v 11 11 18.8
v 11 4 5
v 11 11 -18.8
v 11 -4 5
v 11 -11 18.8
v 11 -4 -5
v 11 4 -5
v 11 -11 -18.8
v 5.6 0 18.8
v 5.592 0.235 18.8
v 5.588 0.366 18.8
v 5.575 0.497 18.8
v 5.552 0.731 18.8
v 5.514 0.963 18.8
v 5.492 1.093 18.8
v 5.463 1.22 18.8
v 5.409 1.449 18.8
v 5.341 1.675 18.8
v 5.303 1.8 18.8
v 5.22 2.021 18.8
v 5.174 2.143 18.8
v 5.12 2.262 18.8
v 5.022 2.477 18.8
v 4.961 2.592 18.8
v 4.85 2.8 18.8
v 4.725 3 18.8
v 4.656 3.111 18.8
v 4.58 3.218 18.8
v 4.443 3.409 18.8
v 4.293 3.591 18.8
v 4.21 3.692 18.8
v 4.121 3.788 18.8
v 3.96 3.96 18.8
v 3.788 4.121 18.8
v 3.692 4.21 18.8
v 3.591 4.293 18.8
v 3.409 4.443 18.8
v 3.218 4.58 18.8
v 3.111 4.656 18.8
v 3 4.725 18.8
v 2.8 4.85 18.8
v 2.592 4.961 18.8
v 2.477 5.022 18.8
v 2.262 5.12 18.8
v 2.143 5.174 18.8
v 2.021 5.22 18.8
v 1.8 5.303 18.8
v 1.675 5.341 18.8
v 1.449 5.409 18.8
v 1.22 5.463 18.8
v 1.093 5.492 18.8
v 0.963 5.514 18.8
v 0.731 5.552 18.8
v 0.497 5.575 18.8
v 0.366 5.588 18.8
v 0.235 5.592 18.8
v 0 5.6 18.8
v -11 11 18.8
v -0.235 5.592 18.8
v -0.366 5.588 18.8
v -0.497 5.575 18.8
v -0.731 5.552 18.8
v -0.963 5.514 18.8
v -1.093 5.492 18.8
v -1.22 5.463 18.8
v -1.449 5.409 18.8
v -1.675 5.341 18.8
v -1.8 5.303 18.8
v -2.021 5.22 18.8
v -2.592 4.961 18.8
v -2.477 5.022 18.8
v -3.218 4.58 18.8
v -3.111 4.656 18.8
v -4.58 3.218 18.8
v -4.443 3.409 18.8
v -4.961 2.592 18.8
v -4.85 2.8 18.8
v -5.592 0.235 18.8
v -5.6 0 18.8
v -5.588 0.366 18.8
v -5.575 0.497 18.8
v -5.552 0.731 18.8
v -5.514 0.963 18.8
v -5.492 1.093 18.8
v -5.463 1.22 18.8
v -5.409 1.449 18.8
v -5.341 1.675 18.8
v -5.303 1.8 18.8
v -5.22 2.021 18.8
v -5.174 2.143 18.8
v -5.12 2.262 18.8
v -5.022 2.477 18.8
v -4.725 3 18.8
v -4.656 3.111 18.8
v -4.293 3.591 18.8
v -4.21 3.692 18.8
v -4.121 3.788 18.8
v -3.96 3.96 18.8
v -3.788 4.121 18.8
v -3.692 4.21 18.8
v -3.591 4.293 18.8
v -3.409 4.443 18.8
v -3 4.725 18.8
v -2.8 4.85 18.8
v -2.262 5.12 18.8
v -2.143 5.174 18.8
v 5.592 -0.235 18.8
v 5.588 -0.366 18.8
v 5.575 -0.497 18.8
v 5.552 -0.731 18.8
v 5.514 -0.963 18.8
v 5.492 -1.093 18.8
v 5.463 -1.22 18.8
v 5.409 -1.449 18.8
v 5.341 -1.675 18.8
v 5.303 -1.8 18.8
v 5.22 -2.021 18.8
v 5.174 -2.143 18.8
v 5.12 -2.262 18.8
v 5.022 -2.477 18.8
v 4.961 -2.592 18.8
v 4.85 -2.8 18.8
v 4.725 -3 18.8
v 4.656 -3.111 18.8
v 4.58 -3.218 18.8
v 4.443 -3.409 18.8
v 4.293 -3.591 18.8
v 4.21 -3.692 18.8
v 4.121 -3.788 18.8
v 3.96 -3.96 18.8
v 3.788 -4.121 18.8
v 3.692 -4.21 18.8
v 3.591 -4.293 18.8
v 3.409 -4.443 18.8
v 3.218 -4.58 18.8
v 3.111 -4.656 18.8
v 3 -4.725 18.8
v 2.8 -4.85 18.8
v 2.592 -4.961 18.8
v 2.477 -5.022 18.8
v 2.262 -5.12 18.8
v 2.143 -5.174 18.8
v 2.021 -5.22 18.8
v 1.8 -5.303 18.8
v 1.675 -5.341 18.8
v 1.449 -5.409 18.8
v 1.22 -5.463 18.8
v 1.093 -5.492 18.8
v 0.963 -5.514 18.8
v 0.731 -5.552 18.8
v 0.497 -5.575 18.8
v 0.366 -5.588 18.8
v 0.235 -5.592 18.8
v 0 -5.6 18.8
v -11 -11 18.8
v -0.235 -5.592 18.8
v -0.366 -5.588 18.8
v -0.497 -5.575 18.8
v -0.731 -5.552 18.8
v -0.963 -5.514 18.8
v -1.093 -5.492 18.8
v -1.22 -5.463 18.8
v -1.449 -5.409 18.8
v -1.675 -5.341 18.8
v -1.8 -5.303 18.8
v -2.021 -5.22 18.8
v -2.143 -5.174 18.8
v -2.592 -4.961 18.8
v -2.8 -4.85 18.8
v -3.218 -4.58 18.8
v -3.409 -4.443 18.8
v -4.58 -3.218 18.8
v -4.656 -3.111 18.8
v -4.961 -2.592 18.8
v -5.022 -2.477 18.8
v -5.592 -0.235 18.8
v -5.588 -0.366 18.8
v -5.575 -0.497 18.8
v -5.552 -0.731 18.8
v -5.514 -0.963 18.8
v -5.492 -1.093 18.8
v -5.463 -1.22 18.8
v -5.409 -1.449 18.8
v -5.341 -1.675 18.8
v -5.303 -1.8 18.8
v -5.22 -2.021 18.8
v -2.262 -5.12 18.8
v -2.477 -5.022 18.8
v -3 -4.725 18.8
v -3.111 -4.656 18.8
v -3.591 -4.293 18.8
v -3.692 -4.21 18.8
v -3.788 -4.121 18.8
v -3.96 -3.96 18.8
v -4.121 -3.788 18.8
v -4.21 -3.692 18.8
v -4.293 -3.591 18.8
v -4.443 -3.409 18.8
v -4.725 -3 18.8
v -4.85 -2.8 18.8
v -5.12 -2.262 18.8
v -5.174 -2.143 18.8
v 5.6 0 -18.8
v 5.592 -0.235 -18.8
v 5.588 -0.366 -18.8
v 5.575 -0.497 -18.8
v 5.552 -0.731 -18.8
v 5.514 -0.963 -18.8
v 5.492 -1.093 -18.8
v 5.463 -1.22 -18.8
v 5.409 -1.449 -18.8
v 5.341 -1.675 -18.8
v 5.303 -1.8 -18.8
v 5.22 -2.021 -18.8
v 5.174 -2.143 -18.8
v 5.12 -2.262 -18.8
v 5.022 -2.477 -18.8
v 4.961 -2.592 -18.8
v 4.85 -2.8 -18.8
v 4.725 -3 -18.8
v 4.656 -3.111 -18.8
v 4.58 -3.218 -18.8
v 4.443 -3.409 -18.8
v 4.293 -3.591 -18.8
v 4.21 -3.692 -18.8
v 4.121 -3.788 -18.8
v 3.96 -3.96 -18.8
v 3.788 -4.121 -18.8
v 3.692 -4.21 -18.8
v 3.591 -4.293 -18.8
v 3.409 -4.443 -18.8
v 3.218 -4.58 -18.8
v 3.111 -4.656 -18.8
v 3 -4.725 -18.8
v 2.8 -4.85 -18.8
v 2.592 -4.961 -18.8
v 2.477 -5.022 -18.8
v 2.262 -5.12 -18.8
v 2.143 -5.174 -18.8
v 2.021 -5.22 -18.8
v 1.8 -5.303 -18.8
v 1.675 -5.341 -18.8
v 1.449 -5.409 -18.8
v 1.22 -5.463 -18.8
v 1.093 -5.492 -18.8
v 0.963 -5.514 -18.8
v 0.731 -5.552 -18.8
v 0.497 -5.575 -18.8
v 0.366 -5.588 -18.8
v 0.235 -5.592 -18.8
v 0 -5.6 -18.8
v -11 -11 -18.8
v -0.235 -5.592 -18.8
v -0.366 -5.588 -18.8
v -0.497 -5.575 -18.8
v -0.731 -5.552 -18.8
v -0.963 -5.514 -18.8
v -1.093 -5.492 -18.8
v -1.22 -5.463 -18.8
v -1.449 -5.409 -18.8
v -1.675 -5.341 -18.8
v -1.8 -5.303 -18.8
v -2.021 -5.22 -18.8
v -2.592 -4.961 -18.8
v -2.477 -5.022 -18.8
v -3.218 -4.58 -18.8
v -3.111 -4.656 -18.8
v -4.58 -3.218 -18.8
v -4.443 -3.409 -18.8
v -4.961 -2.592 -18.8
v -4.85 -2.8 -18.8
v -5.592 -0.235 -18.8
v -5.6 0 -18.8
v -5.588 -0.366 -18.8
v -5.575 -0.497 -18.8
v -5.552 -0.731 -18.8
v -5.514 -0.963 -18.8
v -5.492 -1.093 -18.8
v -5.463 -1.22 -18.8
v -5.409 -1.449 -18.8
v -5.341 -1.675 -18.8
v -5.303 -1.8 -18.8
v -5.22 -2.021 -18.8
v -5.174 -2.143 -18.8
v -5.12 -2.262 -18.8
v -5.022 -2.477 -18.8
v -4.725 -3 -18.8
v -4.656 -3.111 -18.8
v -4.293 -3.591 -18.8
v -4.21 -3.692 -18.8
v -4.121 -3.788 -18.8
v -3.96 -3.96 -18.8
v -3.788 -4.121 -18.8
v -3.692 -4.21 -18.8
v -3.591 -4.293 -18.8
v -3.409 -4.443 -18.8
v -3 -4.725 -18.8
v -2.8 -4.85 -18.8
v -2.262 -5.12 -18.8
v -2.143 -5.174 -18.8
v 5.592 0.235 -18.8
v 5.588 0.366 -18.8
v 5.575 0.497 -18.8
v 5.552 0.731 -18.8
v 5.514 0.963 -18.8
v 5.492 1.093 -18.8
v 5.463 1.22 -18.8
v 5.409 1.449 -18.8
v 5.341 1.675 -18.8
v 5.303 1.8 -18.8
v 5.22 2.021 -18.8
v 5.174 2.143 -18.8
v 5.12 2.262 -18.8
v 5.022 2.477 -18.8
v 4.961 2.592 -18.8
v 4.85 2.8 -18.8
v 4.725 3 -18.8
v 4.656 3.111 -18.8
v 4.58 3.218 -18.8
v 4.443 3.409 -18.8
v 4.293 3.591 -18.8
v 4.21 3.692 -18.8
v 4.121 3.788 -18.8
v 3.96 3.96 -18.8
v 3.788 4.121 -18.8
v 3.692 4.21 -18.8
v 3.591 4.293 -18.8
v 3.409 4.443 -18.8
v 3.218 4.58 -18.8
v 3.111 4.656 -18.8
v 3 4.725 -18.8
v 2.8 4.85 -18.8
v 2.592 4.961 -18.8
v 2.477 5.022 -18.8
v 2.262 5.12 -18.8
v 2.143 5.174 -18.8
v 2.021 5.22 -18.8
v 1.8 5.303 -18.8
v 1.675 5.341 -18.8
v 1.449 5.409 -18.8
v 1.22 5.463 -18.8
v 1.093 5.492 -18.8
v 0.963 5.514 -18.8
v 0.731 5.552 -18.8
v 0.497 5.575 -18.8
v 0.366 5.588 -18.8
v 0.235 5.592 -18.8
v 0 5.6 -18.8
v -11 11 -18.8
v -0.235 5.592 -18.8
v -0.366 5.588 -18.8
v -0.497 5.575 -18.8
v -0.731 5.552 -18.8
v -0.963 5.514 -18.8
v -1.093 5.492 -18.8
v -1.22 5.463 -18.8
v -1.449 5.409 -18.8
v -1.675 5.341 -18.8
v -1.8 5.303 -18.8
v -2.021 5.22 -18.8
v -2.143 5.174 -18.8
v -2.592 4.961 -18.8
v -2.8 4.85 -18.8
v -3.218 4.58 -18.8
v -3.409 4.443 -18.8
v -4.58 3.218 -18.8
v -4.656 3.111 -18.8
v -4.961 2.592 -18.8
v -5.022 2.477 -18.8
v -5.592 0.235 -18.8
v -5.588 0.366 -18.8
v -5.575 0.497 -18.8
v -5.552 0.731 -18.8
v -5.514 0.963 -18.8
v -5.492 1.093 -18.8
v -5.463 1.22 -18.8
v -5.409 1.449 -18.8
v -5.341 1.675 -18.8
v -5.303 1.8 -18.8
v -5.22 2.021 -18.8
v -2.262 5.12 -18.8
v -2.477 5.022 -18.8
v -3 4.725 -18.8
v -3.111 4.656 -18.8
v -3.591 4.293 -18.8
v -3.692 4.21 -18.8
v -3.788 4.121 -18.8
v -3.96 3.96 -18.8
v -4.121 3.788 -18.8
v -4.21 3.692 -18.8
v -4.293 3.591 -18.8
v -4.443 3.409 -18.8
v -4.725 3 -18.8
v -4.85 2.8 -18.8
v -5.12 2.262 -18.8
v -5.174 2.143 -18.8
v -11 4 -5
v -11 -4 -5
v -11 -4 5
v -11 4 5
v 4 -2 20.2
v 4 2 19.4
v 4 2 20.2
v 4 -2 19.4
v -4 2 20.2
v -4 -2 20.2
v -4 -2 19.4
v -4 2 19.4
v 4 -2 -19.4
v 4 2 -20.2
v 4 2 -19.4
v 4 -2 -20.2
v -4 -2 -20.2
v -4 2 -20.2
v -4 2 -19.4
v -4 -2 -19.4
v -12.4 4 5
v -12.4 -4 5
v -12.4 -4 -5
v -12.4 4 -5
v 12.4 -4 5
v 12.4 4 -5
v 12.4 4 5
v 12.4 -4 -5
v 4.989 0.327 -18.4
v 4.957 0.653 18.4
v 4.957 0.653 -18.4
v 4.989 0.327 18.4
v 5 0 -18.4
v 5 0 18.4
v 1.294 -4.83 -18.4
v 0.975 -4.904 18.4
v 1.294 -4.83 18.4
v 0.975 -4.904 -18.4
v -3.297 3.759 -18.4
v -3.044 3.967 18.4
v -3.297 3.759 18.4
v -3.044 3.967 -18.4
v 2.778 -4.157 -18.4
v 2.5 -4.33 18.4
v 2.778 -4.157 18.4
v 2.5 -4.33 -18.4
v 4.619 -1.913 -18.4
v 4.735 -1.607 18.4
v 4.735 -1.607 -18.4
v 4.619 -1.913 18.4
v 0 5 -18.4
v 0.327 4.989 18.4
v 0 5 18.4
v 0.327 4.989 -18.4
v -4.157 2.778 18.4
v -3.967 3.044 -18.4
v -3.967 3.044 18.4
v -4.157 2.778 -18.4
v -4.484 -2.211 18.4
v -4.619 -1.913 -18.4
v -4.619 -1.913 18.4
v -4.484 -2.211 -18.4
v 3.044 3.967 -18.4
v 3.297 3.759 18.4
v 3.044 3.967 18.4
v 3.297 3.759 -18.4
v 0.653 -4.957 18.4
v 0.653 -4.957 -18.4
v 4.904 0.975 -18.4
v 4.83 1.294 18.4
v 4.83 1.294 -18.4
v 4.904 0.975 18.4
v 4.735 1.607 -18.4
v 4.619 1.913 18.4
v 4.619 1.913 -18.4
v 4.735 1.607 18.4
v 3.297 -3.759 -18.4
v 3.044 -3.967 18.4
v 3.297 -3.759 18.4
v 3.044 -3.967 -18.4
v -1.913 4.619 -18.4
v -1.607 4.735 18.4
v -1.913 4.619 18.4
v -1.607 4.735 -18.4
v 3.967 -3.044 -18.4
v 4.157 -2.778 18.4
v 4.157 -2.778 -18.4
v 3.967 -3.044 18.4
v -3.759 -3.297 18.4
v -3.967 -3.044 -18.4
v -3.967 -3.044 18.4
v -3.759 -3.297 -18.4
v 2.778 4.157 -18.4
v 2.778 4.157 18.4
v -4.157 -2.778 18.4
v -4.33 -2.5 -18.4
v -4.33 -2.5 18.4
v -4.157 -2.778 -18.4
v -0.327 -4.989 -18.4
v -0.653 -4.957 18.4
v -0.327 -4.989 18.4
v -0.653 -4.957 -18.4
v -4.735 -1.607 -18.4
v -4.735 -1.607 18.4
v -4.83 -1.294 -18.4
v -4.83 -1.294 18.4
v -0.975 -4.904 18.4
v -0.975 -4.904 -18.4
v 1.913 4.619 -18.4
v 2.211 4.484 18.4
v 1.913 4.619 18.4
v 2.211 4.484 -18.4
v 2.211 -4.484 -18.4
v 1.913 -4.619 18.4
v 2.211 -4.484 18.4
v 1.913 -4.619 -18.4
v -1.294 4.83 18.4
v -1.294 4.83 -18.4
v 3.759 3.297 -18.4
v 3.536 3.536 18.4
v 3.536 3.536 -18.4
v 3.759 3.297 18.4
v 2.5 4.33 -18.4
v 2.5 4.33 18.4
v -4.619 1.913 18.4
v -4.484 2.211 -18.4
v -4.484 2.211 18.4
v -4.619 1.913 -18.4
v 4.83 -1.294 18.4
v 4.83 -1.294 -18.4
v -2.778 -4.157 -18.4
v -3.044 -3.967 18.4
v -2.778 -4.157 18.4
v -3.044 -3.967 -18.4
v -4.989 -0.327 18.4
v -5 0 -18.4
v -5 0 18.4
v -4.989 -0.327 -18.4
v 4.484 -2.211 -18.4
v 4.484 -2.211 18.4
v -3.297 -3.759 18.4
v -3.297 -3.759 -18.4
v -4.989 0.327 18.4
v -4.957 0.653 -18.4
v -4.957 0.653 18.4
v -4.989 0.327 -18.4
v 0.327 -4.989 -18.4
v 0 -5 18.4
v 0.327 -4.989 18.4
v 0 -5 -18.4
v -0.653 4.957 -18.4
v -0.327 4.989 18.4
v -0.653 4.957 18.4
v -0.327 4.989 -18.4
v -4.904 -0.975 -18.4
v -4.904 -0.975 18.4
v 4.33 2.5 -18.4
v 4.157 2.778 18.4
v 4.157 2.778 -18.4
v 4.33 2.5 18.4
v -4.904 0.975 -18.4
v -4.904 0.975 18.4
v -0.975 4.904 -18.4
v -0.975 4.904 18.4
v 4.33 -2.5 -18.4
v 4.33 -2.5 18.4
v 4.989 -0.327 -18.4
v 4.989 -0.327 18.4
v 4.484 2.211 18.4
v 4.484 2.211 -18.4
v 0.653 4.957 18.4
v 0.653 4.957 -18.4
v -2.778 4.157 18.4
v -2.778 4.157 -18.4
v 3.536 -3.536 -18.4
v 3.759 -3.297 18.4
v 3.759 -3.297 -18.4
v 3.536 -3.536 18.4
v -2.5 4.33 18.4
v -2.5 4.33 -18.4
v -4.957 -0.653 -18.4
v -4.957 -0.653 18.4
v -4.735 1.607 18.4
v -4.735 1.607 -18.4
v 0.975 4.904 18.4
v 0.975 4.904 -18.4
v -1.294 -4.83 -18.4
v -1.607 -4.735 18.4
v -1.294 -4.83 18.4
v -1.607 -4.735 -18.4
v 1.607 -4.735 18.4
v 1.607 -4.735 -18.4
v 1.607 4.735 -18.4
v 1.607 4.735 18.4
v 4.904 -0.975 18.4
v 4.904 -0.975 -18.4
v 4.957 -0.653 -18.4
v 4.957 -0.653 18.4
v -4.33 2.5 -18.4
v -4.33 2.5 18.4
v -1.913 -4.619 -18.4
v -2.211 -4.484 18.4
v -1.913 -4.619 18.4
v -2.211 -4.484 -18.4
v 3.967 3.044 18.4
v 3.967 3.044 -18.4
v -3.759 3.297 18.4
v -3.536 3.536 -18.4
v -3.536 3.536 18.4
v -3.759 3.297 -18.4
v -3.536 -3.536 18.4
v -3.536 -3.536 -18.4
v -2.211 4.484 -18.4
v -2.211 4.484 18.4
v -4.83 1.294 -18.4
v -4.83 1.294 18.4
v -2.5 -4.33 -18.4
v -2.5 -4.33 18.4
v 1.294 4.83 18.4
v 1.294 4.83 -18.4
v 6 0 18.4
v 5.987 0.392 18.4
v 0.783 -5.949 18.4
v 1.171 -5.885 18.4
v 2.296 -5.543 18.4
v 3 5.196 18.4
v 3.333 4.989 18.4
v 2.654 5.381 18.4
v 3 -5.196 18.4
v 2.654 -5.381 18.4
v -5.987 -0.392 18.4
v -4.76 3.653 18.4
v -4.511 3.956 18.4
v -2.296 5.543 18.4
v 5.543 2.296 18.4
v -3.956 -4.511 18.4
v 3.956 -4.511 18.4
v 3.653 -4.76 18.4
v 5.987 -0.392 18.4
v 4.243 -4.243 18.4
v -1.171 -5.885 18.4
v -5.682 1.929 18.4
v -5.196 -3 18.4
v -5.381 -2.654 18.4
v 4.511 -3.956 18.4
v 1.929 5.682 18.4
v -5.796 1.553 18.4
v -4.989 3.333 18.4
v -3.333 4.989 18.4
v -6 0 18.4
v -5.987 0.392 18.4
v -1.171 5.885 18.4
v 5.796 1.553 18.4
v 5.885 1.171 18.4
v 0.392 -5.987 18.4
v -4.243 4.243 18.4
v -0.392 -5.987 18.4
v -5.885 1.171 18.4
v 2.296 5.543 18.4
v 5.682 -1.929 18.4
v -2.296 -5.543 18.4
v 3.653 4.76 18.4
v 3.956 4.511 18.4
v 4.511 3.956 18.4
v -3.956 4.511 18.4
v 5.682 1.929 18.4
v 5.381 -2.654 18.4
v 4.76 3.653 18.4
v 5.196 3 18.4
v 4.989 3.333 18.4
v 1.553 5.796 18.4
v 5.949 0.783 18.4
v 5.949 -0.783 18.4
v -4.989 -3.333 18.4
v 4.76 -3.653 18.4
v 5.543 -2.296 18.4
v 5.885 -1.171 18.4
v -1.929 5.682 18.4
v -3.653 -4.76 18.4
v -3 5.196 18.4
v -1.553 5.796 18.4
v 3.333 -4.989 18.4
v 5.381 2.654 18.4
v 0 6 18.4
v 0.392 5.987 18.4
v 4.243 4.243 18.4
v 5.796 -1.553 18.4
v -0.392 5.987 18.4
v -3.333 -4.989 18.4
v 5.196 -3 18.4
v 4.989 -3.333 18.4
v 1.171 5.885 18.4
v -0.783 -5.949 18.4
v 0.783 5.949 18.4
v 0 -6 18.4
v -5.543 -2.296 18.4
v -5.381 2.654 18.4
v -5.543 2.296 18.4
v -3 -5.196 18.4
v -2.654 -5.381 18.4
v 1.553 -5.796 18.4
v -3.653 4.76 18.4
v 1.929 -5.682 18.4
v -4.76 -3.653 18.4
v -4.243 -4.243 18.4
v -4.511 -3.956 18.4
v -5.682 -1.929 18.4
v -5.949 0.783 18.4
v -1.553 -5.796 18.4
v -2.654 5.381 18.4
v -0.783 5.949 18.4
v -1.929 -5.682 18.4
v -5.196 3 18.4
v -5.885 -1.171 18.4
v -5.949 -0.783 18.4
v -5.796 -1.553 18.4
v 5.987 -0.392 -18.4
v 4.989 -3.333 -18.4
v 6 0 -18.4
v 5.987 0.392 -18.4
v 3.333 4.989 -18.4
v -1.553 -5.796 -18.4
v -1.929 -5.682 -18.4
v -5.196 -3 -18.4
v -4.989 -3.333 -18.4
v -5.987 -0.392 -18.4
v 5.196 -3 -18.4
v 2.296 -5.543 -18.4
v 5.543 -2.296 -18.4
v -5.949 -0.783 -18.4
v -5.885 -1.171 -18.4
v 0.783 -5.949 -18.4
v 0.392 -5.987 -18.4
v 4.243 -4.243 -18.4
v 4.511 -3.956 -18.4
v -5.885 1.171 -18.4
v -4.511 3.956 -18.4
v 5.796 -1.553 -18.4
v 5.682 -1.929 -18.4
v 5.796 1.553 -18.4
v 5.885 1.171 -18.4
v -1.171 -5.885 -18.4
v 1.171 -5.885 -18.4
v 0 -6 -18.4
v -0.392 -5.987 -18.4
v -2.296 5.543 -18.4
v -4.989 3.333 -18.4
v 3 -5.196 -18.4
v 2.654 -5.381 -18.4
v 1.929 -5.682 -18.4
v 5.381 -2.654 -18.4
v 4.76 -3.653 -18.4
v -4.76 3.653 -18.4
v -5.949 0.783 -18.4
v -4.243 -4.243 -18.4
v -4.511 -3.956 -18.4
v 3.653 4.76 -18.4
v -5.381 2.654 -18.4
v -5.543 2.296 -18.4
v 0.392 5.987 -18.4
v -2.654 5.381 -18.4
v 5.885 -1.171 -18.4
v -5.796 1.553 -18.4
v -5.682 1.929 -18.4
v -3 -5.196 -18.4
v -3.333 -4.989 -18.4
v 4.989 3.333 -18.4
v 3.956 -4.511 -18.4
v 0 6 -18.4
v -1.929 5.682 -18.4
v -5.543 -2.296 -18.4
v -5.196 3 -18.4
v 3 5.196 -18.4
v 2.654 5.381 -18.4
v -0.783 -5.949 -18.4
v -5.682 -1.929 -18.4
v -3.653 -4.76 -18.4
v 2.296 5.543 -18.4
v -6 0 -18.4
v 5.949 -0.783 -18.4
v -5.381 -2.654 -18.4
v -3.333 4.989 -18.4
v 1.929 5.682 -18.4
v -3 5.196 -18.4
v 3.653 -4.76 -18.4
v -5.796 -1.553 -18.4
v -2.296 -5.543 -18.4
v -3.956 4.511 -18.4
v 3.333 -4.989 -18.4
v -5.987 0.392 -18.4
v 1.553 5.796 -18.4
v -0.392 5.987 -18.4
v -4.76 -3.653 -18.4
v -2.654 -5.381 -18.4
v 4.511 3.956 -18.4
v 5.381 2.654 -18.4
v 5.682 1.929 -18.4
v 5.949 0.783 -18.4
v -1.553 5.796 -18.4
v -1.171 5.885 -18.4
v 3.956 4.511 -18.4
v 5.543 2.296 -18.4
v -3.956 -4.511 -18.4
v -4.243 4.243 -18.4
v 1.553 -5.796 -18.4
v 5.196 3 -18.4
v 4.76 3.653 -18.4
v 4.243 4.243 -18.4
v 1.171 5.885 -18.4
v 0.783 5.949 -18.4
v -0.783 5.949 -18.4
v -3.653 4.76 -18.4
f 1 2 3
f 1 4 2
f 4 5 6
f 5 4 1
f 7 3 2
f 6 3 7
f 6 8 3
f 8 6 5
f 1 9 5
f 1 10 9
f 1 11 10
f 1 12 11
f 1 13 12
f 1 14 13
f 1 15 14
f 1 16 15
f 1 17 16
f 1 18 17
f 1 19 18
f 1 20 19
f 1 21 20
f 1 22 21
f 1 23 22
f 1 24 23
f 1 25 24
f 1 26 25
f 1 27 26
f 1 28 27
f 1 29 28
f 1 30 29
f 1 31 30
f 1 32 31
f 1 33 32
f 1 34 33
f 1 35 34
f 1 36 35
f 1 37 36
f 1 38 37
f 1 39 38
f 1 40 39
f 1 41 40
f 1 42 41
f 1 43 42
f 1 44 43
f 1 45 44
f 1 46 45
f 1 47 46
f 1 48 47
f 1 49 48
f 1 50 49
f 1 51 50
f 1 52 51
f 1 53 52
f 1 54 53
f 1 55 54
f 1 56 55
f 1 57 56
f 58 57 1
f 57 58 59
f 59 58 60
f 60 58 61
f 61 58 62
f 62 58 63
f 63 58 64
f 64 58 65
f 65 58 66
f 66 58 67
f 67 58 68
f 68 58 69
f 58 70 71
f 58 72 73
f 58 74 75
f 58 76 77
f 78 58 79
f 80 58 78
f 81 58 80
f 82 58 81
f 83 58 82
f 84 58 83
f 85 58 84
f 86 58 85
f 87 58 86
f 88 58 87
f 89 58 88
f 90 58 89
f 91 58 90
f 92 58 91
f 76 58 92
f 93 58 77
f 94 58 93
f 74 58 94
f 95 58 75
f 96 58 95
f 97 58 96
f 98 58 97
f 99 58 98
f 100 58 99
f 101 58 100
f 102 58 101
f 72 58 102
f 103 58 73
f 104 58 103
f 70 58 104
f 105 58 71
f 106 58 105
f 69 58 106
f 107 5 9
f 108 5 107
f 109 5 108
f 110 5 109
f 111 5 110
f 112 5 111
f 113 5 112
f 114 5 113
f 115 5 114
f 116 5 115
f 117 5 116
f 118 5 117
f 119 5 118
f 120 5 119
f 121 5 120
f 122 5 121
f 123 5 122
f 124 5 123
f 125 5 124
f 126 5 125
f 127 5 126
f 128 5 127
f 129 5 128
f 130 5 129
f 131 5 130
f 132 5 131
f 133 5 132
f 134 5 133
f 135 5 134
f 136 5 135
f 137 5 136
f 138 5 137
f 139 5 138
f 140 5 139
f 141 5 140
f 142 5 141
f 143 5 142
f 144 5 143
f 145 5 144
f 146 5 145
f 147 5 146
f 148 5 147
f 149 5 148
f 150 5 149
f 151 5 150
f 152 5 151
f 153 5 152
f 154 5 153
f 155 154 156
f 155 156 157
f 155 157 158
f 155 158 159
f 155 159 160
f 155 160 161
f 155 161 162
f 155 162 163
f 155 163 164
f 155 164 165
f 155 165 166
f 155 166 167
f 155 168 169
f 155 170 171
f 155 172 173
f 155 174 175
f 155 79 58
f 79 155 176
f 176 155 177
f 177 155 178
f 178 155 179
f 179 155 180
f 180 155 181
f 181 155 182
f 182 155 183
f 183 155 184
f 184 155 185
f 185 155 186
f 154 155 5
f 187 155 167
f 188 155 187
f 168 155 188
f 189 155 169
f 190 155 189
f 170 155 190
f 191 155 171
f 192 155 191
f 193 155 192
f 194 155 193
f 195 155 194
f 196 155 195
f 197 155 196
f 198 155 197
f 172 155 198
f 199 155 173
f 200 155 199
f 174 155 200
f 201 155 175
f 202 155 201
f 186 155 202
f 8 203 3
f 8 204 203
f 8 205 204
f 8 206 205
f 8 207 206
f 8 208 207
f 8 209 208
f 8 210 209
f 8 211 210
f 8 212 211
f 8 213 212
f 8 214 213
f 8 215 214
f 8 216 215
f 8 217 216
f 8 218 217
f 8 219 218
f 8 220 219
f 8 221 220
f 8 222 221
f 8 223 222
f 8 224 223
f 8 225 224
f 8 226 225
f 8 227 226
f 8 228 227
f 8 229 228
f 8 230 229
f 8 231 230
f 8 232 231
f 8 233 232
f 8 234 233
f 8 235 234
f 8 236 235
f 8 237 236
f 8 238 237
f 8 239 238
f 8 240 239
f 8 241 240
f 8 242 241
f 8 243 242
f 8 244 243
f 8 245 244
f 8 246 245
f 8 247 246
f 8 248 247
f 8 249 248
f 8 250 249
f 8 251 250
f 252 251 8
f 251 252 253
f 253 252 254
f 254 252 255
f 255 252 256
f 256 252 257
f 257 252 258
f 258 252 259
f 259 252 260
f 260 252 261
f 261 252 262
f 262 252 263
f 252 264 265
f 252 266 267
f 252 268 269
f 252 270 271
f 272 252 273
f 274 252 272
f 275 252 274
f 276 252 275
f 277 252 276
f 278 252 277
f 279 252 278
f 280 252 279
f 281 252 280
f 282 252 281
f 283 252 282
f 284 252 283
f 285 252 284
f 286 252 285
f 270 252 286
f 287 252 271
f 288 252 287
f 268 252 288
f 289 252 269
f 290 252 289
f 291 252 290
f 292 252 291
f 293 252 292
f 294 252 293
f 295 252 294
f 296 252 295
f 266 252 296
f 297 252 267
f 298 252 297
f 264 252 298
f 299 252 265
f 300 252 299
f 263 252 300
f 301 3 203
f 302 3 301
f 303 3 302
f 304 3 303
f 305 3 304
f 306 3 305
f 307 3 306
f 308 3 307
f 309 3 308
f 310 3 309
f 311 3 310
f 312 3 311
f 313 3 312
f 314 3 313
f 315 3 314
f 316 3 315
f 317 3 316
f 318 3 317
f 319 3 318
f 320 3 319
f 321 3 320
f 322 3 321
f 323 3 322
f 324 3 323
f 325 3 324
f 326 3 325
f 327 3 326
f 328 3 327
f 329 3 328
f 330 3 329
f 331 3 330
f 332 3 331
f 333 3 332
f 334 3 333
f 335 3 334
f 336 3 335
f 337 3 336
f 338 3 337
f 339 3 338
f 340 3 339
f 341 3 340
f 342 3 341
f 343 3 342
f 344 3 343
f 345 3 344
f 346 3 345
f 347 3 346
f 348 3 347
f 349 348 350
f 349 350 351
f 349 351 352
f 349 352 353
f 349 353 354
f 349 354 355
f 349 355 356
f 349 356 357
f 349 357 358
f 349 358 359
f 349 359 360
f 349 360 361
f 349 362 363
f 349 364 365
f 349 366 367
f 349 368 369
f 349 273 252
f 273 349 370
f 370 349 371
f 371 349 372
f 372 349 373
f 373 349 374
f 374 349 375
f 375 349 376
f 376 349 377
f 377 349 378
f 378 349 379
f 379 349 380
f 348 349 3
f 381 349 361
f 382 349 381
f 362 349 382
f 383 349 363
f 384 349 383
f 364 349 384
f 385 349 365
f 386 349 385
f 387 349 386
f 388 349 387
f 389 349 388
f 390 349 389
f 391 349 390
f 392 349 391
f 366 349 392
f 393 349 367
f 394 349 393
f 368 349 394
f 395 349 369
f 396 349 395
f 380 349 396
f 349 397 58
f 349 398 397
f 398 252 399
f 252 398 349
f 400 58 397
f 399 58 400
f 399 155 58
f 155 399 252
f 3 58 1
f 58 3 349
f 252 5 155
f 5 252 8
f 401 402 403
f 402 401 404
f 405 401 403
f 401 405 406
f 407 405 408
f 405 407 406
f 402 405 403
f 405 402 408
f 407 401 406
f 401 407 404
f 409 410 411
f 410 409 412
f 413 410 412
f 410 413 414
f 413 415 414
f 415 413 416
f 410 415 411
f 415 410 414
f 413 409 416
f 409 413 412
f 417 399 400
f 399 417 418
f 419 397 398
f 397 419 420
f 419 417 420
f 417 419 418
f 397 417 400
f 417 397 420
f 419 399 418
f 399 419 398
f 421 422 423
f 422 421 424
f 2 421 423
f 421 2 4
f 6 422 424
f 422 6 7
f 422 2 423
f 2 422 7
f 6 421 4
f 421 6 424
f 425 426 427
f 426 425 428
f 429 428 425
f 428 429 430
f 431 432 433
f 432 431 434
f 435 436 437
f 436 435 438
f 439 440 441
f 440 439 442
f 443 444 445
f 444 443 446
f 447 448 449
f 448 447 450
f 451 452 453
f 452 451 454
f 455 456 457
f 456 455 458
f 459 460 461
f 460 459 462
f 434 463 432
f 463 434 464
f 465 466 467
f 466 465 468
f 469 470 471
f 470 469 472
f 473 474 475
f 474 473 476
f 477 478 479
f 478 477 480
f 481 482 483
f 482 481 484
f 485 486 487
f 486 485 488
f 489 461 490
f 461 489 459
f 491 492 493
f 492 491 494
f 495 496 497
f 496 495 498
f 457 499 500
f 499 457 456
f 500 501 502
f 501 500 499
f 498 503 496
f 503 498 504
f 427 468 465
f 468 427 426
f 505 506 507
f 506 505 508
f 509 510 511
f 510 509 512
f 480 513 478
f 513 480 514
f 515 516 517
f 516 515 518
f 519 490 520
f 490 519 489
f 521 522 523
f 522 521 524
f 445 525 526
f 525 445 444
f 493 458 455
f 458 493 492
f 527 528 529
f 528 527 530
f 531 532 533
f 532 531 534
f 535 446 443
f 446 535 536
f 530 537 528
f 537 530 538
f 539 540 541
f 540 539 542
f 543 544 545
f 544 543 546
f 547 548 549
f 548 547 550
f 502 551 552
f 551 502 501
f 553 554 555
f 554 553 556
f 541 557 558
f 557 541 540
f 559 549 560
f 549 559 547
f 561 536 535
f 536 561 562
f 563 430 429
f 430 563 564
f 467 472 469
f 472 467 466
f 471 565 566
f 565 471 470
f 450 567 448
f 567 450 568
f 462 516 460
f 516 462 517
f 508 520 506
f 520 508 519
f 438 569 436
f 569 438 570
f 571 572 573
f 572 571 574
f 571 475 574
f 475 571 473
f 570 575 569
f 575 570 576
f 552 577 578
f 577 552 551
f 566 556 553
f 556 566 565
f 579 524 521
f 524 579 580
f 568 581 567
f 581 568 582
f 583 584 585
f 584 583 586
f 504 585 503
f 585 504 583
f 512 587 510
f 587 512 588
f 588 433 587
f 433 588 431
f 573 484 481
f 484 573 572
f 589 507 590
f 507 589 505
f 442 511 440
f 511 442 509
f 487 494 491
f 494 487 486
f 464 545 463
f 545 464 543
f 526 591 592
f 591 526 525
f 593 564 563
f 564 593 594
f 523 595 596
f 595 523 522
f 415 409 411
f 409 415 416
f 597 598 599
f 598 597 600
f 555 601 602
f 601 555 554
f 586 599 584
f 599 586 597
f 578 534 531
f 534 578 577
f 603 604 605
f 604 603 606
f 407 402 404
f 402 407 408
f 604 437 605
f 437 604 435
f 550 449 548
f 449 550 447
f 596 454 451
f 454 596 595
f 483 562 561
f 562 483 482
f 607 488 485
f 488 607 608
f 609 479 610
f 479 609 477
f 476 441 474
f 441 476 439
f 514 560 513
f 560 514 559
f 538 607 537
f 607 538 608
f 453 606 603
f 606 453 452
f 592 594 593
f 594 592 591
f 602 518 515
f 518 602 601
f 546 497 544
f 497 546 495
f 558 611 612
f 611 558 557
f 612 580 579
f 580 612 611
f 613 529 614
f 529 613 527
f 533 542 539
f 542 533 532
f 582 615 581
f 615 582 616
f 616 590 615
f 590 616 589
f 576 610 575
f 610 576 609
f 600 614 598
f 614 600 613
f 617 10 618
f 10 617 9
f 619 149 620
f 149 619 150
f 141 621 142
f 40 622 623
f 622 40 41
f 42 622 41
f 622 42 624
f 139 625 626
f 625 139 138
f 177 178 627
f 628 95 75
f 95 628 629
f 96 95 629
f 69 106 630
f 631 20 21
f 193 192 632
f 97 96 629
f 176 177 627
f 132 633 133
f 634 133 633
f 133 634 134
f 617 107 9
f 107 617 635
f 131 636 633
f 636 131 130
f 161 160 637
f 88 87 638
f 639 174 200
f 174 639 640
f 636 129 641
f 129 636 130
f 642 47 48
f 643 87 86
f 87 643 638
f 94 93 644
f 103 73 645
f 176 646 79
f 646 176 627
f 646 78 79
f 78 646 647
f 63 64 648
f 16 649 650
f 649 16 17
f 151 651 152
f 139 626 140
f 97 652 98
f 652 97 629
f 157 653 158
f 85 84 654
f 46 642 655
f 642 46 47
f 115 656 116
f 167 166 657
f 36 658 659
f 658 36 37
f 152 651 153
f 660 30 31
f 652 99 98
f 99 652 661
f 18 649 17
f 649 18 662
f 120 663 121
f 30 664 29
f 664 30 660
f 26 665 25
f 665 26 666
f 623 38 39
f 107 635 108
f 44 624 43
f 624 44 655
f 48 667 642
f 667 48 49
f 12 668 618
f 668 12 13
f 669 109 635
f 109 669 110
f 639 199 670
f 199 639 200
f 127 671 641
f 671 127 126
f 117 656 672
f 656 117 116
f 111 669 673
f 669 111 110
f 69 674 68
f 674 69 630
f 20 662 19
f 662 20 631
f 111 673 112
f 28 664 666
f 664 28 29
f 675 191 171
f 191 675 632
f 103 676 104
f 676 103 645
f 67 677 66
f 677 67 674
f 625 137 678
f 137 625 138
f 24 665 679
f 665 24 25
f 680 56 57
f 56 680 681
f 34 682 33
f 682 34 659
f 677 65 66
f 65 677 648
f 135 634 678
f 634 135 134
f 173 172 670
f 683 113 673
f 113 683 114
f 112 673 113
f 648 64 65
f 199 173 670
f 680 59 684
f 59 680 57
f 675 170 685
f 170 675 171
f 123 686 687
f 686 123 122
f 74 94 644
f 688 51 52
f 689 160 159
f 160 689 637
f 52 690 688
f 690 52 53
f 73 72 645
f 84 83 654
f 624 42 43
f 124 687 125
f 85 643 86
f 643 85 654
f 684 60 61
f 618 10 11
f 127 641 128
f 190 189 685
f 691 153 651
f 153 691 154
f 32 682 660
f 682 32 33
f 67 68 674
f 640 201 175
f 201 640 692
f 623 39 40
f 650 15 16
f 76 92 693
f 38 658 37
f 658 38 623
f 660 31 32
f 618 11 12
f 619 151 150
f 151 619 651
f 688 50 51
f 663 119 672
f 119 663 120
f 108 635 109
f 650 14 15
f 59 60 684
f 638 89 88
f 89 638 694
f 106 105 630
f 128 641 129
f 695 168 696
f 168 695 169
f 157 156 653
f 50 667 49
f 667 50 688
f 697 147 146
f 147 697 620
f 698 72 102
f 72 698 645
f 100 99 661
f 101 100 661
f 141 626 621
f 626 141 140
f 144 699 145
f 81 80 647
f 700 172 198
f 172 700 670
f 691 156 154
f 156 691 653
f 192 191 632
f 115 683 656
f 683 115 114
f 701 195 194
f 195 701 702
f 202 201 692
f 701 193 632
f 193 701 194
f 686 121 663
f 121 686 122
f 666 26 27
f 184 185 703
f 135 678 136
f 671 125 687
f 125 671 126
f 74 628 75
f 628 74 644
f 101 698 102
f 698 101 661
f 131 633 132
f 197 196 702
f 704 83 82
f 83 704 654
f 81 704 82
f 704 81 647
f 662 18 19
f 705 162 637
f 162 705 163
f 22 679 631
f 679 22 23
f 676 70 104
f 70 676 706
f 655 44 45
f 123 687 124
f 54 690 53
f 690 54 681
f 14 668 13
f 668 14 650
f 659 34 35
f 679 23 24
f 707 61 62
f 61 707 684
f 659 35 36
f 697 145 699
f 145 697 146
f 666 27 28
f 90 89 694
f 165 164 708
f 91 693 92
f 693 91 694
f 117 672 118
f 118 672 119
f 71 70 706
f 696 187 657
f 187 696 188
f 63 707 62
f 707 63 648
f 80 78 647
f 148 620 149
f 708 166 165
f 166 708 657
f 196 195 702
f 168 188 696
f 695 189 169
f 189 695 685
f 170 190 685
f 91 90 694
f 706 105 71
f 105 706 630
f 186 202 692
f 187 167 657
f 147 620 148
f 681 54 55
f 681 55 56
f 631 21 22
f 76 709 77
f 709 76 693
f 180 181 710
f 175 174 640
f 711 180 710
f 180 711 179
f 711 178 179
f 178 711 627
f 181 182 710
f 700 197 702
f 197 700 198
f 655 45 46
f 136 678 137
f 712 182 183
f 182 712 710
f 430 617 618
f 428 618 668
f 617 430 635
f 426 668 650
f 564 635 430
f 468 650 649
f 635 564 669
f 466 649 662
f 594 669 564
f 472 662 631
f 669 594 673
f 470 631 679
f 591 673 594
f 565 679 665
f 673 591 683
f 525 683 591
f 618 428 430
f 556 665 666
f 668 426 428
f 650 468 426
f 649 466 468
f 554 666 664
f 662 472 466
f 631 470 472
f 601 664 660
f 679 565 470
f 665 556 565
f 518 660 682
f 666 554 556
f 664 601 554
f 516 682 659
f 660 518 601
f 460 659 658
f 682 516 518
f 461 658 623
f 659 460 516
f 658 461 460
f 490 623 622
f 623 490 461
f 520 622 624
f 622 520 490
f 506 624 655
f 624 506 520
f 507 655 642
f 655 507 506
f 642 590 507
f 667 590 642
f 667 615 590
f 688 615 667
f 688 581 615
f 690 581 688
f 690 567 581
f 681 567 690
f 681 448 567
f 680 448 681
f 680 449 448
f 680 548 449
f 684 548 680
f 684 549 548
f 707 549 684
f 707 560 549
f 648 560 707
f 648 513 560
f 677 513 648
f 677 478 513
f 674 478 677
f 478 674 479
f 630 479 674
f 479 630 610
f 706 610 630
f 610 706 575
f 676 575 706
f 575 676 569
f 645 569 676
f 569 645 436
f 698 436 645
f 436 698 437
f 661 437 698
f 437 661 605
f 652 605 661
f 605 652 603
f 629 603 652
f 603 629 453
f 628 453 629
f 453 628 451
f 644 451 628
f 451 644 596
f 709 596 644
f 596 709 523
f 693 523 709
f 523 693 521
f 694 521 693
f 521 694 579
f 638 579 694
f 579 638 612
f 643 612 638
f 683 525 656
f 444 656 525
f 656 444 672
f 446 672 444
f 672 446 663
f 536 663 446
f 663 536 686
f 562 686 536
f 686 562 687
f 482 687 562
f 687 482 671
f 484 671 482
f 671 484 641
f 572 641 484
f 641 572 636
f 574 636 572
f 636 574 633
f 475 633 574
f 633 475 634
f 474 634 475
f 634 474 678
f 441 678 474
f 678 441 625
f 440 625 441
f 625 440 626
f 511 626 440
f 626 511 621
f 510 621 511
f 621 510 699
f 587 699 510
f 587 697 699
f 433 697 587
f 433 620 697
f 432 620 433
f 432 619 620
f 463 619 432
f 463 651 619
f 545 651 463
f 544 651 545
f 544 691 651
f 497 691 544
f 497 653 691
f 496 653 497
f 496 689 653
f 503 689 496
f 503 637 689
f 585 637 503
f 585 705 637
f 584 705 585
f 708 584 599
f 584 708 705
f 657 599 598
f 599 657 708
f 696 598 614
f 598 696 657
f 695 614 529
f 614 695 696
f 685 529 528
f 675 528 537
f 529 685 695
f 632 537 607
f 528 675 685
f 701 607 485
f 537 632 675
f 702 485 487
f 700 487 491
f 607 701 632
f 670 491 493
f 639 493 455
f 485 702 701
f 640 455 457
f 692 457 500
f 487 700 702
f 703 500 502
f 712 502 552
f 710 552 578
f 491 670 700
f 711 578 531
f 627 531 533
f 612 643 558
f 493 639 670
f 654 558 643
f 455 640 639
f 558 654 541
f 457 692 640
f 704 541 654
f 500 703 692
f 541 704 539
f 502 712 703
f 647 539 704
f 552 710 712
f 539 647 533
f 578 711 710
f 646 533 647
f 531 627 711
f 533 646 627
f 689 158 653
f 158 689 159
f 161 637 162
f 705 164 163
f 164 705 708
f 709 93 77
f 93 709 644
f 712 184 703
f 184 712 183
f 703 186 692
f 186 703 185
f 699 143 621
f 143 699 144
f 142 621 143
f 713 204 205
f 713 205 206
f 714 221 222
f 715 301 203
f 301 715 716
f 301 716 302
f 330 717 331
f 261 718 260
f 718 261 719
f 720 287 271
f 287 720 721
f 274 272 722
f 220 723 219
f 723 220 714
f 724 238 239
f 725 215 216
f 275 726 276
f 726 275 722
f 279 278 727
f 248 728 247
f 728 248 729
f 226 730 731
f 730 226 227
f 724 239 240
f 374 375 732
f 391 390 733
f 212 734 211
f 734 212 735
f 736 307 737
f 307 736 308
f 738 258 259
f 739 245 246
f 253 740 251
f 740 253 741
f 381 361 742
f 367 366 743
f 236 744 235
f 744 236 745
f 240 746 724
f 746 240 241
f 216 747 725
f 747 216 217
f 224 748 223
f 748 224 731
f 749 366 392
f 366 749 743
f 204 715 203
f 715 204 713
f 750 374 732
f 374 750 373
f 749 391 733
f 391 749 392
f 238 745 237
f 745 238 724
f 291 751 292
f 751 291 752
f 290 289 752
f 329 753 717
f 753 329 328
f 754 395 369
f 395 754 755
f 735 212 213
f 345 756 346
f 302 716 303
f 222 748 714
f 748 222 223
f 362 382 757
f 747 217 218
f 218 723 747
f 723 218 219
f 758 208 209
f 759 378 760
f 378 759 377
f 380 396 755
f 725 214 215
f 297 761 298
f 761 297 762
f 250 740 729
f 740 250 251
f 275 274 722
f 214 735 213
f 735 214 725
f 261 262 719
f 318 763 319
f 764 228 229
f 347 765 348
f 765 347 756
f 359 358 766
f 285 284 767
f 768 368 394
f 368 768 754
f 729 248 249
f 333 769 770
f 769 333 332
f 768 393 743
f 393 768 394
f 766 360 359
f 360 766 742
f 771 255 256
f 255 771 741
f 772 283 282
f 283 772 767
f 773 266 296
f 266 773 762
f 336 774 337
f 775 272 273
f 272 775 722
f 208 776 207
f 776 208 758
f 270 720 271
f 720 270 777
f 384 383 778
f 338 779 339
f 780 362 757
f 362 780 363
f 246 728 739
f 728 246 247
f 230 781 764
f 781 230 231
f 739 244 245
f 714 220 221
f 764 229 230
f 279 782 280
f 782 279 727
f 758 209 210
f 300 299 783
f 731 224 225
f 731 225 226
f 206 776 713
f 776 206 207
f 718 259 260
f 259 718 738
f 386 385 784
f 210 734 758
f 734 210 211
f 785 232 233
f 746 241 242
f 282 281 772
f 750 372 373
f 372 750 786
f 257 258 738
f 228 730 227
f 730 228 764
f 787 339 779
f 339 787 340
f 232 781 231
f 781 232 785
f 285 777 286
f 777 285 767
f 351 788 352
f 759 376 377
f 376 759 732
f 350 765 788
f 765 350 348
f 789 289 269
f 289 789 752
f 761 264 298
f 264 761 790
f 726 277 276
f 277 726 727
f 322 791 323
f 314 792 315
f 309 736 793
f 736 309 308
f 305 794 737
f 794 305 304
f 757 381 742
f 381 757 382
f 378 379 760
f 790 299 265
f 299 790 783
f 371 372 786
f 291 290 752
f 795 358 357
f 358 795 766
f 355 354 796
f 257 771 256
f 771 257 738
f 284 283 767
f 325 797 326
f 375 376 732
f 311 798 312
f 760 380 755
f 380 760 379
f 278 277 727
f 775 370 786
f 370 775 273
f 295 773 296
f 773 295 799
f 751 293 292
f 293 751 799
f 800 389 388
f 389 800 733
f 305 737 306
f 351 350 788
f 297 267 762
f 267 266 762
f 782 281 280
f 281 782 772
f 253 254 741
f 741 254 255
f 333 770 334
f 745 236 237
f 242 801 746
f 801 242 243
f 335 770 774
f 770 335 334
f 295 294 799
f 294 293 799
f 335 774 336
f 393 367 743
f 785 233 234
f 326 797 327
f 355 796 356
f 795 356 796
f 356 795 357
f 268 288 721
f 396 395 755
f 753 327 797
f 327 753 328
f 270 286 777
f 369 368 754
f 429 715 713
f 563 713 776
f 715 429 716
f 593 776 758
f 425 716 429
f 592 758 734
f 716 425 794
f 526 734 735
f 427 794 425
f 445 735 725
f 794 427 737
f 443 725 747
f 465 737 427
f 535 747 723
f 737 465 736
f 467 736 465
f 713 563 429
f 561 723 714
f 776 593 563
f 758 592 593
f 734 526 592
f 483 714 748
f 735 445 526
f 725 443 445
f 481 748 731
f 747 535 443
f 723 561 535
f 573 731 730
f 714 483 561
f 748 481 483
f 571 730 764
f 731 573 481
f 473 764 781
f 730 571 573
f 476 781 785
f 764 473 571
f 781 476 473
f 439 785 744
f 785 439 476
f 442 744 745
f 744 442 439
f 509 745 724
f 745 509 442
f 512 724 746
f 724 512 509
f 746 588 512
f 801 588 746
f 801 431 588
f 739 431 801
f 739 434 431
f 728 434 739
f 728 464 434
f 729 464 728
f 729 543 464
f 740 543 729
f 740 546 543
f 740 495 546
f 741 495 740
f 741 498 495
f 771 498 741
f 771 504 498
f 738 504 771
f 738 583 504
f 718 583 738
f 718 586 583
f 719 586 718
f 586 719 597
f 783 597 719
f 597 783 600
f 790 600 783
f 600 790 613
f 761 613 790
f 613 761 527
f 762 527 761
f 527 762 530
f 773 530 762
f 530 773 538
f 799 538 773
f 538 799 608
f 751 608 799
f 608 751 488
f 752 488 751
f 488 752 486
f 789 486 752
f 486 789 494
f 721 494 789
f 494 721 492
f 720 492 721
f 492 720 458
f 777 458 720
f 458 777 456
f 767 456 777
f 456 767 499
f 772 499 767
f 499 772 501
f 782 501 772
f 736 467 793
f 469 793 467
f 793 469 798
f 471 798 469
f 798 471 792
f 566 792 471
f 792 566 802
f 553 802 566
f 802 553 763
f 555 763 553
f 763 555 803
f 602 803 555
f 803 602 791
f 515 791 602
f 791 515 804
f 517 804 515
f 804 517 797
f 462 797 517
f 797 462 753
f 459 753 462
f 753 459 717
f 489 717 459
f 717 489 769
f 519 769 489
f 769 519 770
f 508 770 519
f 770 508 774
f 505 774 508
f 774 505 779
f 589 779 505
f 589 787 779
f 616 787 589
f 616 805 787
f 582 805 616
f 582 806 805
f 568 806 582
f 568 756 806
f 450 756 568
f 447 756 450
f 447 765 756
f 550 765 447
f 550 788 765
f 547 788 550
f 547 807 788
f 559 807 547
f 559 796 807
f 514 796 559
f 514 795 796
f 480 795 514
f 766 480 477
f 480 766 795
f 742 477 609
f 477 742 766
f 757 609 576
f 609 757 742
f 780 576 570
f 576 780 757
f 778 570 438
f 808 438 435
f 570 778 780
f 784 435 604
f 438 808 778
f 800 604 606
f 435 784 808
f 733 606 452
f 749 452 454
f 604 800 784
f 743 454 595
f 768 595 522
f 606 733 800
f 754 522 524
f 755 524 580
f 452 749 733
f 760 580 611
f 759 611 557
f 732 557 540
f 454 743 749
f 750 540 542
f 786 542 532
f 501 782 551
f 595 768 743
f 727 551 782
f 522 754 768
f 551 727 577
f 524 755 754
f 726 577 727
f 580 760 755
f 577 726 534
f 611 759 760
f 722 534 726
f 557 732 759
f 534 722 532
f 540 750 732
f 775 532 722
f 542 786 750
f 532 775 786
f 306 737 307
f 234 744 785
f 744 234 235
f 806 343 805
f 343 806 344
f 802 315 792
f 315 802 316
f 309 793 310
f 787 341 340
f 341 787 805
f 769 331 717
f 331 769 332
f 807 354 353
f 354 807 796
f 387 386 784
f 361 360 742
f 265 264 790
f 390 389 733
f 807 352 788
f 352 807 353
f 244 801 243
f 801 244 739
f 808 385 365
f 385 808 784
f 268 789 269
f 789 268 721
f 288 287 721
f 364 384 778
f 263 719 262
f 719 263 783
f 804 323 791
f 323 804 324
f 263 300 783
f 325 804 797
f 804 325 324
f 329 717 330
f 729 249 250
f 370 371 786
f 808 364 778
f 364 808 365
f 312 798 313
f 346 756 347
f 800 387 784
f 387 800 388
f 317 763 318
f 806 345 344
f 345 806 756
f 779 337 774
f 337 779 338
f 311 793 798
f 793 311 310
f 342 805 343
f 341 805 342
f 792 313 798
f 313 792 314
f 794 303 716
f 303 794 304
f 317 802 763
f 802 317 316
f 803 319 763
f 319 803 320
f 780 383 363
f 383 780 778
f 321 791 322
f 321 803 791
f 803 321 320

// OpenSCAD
$fn = 96;

// Parameters (mm)
bbox_x = 22.0;
bbox_y = 22.0;
bbox_z = 37.6;

body_x = bbox_x;
body_y = bbox_y;
body_z = bbox_z;

bore_d = 10.0;

tab_x = 8.0;
tab_y = 4.0;
tab_z = 2.0;

side_key_x = 2.0;
side_key_y = 8.0;
side_key_z = 10.0;

connect_overlap = 0.6;   // small overlap to guarantee connectivity
bore_chamfer_h = 1.0;
bore_chamfer_d = 12.0;

// ---- Base solids ----
module outer_body_block() {
  cube([body_x, body_y, body_z], center=true);
}

module top_center_tab() {
  translate([0, 0, body_z/2 + tab_z/2 - connect_overlap])
    cube([tab_x, tab_y, tab_z], center=true);
}

module bottom_center_tab() {
  translate([0, 0, -body_z/2 - tab_z/2 + connect_overlap])
    cube([tab_x, tab_y, tab_z], center=true);
}

module left_side_key() {
  translate([-body_x/2 - side_key_x/2 + connect_overlap, 0, 0])
    cube([side_key_x, side_key_y, side_key_z], center=true);
}

module right_side_key() {
  translate([ body_x/2 + side_key_x/2 - connect_overlap, 0, 0])
    cube([side_key_x, side_key_y, side_key_z], center=true);
}

// ---- Bore cutters ----
module central_through_bore() {
  cylinder(h=body_z + 2*connect_overlap, r=bore_d/2, center=true);
}

module bore_chamfer_top() {
  // frustum: larger at top face, smaller into bore
  translate([0, 0, body_z/2 - bore_chamfer_h/2 + connect_overlap])
    cylinder(h=bore_chamfer_h, r1=bore_chamfer_d/2, r2=bore_d/2, center=true);
}

module bore_chamfer_bottom() {
  translate([0, 0, -body_z/2 + bore_chamfer_h/2 - connect_overlap])
    cylinder(h=bore_chamfer_h, r1=bore_d/2, r2=bore_chamfer_d/2, center=true);
}

// ---- Final model ----
difference() {
  union() {
    outer_body_block();
    top_center_tab();
    bottom_center_tab();
    left_side_key();
    right_side_key();
  }

  union() {
    central_through_bore();
    bore_chamfer_top();
    bore_chamfer_bottom();
  }
}
